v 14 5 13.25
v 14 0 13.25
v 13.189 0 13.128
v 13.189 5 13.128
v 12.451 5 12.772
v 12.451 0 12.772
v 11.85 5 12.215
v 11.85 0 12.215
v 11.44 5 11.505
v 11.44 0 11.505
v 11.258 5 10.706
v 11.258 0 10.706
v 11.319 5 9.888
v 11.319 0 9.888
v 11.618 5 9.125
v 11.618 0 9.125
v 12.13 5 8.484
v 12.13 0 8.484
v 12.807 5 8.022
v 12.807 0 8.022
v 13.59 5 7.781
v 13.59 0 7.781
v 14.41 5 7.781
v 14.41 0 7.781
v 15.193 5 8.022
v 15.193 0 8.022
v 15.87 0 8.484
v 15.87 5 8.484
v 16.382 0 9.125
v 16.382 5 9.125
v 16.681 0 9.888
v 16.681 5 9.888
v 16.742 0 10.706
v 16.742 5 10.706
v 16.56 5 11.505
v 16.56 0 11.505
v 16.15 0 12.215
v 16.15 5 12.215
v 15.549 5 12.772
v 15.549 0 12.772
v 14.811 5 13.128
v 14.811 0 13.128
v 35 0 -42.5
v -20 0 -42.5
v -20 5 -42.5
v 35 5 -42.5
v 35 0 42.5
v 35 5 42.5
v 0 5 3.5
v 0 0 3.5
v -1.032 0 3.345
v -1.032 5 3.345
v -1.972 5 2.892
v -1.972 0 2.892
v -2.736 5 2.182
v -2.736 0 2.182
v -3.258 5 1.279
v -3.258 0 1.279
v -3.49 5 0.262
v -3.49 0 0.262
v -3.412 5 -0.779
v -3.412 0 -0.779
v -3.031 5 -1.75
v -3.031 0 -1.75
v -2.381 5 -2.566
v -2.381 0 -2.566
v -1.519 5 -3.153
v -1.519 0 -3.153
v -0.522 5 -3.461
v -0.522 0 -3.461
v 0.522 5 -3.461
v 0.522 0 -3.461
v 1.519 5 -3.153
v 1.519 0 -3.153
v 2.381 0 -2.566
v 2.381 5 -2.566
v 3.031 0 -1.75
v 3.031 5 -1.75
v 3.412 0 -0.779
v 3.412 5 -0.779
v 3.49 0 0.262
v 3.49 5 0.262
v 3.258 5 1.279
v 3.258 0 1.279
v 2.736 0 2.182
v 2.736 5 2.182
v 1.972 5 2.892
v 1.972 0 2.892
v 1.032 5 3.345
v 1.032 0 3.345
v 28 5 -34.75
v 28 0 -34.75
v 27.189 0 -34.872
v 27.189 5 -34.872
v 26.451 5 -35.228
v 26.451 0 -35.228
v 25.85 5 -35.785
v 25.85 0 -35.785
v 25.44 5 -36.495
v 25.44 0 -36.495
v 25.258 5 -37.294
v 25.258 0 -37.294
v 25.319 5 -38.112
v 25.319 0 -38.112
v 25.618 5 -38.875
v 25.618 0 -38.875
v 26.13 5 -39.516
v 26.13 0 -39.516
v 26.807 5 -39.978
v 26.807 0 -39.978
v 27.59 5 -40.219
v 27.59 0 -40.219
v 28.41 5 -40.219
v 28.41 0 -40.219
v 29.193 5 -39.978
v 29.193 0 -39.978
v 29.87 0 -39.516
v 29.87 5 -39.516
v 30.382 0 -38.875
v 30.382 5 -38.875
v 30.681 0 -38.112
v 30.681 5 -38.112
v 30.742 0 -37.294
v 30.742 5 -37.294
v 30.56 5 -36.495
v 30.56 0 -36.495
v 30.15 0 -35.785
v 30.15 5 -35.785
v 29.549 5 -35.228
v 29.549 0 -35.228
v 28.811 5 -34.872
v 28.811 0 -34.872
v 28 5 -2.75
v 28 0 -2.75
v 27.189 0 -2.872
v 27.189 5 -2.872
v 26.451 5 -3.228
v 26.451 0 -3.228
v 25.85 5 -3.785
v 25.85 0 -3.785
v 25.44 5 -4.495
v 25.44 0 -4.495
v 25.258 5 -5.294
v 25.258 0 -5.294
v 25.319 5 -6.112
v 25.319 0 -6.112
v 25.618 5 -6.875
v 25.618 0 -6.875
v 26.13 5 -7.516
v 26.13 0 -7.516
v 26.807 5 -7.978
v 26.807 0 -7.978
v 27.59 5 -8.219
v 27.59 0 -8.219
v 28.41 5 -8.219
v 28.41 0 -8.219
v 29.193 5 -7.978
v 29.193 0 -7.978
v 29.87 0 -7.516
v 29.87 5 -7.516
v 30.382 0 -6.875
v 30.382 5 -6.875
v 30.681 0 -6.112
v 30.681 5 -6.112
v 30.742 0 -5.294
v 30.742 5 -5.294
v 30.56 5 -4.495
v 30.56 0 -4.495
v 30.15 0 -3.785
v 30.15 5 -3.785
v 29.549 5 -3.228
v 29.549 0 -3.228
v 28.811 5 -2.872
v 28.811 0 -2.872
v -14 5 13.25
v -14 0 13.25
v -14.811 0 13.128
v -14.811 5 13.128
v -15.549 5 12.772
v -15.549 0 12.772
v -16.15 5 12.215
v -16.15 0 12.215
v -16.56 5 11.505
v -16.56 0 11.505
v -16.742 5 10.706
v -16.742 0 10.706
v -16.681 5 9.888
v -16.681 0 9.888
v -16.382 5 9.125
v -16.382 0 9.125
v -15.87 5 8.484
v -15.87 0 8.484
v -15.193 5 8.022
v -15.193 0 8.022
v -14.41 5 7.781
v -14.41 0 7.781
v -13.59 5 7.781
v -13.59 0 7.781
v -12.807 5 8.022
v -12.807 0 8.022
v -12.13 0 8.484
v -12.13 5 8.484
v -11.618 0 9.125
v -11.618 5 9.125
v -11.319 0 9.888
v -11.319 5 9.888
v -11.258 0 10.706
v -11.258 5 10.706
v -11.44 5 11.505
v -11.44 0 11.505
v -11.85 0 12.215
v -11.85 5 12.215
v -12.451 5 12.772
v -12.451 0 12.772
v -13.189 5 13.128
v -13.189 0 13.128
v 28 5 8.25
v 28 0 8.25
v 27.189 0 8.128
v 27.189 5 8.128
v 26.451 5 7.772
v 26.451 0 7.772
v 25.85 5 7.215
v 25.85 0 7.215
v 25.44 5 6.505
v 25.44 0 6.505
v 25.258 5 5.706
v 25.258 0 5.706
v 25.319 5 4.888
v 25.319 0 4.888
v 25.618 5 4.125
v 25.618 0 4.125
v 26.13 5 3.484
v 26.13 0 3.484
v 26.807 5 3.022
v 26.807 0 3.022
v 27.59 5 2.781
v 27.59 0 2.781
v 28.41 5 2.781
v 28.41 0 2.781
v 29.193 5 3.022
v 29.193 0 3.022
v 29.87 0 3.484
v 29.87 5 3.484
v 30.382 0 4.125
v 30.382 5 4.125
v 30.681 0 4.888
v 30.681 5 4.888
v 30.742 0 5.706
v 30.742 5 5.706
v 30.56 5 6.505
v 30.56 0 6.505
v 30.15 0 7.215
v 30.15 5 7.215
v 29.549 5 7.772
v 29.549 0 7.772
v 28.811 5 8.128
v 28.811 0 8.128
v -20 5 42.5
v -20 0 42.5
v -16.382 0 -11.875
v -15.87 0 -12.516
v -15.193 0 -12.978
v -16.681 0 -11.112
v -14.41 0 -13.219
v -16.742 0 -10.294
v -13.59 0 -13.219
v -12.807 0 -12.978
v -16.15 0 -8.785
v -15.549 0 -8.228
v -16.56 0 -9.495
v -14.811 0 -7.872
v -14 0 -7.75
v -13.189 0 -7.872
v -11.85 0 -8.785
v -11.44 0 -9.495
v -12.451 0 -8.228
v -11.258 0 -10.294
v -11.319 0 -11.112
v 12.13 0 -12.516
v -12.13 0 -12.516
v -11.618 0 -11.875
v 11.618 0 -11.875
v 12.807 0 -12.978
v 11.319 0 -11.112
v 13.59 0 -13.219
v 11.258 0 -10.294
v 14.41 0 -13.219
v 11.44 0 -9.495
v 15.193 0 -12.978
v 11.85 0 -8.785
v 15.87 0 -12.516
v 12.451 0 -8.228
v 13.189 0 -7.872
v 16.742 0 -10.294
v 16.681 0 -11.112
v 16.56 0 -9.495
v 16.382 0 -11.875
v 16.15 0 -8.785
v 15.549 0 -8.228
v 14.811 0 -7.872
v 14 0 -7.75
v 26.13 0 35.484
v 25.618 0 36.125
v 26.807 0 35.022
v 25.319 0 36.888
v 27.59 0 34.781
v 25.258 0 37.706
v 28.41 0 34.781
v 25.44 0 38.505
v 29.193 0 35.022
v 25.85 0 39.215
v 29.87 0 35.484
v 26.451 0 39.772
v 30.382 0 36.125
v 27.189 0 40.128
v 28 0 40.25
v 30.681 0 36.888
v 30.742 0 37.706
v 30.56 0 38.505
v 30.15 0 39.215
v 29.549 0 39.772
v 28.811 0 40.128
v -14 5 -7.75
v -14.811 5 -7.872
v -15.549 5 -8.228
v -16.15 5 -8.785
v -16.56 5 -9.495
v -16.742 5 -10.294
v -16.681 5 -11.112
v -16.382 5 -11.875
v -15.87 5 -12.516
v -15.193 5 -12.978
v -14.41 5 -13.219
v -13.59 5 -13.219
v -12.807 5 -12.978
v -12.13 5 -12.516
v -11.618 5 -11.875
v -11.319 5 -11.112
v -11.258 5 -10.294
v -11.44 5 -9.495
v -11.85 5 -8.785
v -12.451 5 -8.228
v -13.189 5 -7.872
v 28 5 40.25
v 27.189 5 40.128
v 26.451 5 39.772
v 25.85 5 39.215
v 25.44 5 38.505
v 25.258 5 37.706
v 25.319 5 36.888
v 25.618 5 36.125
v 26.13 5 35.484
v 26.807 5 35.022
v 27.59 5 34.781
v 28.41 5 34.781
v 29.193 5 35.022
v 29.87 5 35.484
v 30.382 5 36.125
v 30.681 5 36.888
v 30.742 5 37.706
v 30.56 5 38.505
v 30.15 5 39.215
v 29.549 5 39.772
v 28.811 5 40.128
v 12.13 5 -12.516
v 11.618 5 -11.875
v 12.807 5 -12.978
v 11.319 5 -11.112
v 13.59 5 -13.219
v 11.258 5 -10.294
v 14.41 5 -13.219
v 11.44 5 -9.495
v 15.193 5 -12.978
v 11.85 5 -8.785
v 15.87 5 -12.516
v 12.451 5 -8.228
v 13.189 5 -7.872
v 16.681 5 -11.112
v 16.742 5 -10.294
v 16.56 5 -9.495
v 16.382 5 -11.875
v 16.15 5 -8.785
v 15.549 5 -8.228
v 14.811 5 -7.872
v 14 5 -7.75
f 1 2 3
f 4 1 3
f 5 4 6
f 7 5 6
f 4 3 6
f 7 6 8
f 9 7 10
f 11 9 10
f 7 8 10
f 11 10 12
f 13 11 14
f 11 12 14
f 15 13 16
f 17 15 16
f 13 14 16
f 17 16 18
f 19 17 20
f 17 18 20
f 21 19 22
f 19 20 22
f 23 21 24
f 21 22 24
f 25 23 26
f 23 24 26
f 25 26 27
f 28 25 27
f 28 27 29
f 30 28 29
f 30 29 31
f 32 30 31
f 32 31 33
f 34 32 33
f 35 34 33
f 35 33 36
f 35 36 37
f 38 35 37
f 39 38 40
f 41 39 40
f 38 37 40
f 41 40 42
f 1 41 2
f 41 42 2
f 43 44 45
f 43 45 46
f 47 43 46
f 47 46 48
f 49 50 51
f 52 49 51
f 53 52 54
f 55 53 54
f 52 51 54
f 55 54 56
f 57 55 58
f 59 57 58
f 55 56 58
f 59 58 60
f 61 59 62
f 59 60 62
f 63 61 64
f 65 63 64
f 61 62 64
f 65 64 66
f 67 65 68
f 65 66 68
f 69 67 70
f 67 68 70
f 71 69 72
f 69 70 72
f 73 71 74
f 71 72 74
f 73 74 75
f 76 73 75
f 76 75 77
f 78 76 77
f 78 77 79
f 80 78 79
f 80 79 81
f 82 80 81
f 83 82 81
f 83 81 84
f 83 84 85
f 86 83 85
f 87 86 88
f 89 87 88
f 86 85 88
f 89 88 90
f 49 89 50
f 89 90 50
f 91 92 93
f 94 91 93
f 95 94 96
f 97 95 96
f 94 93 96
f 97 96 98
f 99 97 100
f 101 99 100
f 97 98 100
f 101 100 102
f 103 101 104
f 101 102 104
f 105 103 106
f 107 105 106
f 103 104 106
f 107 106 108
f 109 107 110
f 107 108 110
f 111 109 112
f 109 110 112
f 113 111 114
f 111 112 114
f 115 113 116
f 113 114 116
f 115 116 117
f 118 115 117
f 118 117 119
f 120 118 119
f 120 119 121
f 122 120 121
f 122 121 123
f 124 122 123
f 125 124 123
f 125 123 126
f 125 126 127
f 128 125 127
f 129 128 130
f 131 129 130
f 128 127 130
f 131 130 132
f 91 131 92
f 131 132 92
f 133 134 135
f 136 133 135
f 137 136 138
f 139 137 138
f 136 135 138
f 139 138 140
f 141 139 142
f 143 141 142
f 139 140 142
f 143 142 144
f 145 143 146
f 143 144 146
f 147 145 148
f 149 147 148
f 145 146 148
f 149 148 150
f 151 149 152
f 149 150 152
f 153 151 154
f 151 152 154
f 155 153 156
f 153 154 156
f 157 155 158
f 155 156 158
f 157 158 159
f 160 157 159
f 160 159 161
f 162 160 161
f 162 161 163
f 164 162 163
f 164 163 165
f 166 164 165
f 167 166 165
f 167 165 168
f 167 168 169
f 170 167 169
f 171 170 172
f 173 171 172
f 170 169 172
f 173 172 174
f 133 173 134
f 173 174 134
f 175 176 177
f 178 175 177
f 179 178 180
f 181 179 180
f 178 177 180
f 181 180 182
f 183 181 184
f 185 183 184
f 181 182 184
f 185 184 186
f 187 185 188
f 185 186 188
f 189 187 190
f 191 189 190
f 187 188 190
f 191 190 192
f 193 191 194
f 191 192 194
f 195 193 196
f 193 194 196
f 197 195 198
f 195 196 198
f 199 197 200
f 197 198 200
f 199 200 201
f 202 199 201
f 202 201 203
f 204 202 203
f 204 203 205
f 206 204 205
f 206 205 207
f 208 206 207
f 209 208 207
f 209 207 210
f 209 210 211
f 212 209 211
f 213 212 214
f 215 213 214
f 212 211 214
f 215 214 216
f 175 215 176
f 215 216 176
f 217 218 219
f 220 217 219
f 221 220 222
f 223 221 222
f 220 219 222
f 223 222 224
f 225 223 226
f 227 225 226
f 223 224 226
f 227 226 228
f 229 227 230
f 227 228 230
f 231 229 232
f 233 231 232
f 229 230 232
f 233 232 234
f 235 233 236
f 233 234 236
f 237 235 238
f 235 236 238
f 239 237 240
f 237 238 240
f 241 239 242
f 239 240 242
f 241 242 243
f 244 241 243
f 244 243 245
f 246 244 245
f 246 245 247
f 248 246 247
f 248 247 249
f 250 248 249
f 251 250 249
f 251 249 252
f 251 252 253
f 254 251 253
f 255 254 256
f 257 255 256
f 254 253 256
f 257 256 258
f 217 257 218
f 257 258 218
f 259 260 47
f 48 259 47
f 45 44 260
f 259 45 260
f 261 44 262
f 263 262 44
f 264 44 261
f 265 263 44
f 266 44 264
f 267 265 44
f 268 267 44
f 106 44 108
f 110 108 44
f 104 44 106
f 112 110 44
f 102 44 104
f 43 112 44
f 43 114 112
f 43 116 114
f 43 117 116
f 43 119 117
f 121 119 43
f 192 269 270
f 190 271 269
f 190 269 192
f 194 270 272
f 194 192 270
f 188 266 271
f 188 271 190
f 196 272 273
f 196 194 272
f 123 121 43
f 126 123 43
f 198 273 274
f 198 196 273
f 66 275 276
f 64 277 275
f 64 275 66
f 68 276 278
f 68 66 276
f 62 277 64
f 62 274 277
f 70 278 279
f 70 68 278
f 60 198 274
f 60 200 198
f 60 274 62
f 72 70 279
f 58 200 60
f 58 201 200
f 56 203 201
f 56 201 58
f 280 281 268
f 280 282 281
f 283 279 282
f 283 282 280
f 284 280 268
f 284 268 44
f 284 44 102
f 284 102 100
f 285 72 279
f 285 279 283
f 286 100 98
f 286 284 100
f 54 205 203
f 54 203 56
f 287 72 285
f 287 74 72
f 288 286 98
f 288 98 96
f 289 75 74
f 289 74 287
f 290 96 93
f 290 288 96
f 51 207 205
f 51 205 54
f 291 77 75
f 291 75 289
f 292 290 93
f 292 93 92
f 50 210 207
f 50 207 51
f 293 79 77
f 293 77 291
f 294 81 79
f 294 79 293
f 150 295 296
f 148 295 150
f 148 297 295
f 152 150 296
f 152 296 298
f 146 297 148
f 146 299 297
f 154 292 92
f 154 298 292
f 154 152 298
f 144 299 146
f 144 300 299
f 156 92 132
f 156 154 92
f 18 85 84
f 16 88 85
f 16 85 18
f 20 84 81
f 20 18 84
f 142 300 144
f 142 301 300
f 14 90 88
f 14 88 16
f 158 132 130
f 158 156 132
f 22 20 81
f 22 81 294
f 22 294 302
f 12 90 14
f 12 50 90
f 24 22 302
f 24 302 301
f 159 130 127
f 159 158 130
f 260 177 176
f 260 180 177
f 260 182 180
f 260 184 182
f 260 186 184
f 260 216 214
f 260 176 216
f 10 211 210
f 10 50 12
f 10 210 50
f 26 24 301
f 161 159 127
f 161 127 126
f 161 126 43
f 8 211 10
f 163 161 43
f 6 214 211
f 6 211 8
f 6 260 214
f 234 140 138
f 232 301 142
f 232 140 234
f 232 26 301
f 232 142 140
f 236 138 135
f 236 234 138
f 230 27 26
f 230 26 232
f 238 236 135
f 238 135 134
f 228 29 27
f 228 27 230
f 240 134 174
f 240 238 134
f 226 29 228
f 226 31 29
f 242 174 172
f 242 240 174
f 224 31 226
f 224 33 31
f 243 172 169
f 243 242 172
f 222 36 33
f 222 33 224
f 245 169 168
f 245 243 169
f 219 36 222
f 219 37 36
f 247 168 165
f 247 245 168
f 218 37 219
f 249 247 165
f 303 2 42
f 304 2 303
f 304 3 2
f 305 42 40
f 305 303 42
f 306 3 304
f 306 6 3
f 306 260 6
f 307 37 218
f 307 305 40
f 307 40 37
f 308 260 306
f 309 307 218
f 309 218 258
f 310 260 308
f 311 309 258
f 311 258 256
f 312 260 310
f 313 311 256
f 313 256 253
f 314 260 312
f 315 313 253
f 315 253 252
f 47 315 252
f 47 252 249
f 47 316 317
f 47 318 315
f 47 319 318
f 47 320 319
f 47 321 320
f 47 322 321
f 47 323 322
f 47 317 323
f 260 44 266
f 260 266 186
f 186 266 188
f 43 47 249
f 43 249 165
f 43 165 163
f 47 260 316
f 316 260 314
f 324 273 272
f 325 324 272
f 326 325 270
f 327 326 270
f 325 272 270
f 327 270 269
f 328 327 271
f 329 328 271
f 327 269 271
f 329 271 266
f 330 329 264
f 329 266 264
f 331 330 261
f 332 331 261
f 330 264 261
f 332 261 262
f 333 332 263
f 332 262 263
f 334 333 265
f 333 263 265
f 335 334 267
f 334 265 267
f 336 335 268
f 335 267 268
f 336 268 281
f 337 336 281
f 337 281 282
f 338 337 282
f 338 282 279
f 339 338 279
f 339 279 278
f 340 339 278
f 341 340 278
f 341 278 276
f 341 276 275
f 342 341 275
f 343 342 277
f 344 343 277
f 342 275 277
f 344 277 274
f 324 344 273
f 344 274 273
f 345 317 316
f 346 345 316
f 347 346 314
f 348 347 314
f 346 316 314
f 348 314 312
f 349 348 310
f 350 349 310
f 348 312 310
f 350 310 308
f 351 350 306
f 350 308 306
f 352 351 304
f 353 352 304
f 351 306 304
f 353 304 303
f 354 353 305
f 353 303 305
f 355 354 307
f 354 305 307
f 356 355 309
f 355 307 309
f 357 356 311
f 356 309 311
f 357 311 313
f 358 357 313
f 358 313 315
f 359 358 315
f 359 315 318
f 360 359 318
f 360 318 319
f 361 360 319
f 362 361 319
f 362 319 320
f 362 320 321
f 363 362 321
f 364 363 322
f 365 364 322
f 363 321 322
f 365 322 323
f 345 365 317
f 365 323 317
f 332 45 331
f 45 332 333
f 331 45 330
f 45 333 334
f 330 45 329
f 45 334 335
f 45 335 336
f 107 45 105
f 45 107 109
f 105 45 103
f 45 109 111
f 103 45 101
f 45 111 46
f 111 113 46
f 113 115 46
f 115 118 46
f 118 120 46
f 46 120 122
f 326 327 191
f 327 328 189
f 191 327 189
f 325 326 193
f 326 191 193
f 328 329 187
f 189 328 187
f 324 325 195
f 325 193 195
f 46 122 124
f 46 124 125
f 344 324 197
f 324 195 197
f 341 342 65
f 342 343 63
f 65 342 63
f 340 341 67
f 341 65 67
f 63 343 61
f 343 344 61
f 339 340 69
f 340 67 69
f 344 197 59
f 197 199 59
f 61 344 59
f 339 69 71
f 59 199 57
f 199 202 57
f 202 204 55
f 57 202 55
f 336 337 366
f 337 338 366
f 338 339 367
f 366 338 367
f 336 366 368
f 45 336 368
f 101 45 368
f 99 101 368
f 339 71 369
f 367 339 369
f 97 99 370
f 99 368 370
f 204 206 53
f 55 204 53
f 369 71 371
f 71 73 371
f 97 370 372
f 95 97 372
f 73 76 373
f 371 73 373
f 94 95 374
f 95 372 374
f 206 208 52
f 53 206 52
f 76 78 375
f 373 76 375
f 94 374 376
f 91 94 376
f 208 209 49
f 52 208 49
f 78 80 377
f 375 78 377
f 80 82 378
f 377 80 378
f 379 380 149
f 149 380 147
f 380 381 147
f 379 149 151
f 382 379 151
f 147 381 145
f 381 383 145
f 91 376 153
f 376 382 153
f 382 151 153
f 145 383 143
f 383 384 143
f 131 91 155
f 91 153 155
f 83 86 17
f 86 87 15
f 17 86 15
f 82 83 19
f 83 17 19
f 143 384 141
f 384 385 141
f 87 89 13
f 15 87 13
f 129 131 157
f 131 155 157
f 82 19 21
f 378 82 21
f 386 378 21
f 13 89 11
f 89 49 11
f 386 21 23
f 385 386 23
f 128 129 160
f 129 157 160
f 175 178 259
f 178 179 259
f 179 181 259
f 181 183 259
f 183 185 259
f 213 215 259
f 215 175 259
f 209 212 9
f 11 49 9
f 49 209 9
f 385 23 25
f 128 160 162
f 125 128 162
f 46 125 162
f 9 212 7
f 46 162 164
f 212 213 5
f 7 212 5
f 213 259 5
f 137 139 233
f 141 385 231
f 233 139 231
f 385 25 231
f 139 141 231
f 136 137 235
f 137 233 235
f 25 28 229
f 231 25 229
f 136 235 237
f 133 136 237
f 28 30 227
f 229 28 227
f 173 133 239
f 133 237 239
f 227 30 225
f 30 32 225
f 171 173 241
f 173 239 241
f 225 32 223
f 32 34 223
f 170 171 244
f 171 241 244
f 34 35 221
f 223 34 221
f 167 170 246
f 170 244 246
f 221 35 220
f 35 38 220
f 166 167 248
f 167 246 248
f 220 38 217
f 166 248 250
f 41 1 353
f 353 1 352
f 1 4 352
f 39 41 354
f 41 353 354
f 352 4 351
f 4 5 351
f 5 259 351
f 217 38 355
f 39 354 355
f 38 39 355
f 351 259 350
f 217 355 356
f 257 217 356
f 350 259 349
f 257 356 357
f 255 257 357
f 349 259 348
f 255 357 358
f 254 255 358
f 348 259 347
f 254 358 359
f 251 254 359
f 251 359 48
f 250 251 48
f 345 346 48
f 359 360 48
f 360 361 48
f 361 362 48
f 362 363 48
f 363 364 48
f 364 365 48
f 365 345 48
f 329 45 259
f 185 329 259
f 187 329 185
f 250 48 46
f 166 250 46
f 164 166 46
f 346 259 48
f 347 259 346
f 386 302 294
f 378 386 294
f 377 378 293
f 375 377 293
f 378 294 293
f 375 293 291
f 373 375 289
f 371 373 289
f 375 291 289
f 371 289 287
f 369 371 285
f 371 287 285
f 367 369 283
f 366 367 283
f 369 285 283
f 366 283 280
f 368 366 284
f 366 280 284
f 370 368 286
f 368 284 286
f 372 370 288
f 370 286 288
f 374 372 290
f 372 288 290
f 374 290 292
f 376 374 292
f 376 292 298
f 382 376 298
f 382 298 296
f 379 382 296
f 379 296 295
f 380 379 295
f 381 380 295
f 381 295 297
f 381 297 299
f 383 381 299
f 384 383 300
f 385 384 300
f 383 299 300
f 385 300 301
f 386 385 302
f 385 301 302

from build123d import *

# Parameters (mm, degrees)
SKETCH1_W           = 55
SKETCH1_H           = 85
SKETCH1_R           = 2.75
SKETCH1_R_2         = 3.5
BOSS_EXTRUDE1_DEPTH = 5


with BuildPart() as part:
    # Sketch1 → Boss-Extrude1 (new body)
    with BuildSketch(Plane.XZ):
        with Locations((7.5, 0)):
            Rectangle(SKETCH1_W, SKETCH1_H)
        with Locations(Location((14, 10.5, 0), (0, 0, 90))):
            Circle(SKETCH1_R, mode=Mode.SUBTRACT)
        with Locations(Location((-14, 10.5, 0), (0, 0, 90))):
            Circle(SKETCH1_R, mode=Mode.SUBTRACT)
        with Locations(Location((-14, -10.5, 0), (0, 0, 90))):
            Circle(SKETCH1_R, mode=Mode.SUBTRACT)
        with Locations(Location((14, -10.5, 0), (0, 0, 90))):
            Circle(SKETCH1_R, mode=Mode.SUBTRACT)
        with Locations(Location((28, 37.5, 0), (0, 0, 90))):
            Circle(SKETCH1_R, mode=Mode.SUBTRACT)
        with Locations(Location((28, 5.5, 0), (0, 0, 90))):
            Circle(SKETCH1_R, mode=Mode.SUBTRACT)
        with Locations(Location((28, -5.5, 0), (0, 0, 90))):
            Circle(SKETCH1_R, mode=Mode.SUBTRACT)
        with Locations(Location((28, -37.5, 0), (0, 0, 90))):
            Circle(SKETCH1_R, mode=Mode.SUBTRACT)
        with Locations(Location((0, 0, 0), (0, 0, 90))):
            Circle(SKETCH1_R_2, mode=Mode.SUBTRACT)
    extrude(amount=-BOSS_EXTRUDE1_DEPTH)


solid = part.part
